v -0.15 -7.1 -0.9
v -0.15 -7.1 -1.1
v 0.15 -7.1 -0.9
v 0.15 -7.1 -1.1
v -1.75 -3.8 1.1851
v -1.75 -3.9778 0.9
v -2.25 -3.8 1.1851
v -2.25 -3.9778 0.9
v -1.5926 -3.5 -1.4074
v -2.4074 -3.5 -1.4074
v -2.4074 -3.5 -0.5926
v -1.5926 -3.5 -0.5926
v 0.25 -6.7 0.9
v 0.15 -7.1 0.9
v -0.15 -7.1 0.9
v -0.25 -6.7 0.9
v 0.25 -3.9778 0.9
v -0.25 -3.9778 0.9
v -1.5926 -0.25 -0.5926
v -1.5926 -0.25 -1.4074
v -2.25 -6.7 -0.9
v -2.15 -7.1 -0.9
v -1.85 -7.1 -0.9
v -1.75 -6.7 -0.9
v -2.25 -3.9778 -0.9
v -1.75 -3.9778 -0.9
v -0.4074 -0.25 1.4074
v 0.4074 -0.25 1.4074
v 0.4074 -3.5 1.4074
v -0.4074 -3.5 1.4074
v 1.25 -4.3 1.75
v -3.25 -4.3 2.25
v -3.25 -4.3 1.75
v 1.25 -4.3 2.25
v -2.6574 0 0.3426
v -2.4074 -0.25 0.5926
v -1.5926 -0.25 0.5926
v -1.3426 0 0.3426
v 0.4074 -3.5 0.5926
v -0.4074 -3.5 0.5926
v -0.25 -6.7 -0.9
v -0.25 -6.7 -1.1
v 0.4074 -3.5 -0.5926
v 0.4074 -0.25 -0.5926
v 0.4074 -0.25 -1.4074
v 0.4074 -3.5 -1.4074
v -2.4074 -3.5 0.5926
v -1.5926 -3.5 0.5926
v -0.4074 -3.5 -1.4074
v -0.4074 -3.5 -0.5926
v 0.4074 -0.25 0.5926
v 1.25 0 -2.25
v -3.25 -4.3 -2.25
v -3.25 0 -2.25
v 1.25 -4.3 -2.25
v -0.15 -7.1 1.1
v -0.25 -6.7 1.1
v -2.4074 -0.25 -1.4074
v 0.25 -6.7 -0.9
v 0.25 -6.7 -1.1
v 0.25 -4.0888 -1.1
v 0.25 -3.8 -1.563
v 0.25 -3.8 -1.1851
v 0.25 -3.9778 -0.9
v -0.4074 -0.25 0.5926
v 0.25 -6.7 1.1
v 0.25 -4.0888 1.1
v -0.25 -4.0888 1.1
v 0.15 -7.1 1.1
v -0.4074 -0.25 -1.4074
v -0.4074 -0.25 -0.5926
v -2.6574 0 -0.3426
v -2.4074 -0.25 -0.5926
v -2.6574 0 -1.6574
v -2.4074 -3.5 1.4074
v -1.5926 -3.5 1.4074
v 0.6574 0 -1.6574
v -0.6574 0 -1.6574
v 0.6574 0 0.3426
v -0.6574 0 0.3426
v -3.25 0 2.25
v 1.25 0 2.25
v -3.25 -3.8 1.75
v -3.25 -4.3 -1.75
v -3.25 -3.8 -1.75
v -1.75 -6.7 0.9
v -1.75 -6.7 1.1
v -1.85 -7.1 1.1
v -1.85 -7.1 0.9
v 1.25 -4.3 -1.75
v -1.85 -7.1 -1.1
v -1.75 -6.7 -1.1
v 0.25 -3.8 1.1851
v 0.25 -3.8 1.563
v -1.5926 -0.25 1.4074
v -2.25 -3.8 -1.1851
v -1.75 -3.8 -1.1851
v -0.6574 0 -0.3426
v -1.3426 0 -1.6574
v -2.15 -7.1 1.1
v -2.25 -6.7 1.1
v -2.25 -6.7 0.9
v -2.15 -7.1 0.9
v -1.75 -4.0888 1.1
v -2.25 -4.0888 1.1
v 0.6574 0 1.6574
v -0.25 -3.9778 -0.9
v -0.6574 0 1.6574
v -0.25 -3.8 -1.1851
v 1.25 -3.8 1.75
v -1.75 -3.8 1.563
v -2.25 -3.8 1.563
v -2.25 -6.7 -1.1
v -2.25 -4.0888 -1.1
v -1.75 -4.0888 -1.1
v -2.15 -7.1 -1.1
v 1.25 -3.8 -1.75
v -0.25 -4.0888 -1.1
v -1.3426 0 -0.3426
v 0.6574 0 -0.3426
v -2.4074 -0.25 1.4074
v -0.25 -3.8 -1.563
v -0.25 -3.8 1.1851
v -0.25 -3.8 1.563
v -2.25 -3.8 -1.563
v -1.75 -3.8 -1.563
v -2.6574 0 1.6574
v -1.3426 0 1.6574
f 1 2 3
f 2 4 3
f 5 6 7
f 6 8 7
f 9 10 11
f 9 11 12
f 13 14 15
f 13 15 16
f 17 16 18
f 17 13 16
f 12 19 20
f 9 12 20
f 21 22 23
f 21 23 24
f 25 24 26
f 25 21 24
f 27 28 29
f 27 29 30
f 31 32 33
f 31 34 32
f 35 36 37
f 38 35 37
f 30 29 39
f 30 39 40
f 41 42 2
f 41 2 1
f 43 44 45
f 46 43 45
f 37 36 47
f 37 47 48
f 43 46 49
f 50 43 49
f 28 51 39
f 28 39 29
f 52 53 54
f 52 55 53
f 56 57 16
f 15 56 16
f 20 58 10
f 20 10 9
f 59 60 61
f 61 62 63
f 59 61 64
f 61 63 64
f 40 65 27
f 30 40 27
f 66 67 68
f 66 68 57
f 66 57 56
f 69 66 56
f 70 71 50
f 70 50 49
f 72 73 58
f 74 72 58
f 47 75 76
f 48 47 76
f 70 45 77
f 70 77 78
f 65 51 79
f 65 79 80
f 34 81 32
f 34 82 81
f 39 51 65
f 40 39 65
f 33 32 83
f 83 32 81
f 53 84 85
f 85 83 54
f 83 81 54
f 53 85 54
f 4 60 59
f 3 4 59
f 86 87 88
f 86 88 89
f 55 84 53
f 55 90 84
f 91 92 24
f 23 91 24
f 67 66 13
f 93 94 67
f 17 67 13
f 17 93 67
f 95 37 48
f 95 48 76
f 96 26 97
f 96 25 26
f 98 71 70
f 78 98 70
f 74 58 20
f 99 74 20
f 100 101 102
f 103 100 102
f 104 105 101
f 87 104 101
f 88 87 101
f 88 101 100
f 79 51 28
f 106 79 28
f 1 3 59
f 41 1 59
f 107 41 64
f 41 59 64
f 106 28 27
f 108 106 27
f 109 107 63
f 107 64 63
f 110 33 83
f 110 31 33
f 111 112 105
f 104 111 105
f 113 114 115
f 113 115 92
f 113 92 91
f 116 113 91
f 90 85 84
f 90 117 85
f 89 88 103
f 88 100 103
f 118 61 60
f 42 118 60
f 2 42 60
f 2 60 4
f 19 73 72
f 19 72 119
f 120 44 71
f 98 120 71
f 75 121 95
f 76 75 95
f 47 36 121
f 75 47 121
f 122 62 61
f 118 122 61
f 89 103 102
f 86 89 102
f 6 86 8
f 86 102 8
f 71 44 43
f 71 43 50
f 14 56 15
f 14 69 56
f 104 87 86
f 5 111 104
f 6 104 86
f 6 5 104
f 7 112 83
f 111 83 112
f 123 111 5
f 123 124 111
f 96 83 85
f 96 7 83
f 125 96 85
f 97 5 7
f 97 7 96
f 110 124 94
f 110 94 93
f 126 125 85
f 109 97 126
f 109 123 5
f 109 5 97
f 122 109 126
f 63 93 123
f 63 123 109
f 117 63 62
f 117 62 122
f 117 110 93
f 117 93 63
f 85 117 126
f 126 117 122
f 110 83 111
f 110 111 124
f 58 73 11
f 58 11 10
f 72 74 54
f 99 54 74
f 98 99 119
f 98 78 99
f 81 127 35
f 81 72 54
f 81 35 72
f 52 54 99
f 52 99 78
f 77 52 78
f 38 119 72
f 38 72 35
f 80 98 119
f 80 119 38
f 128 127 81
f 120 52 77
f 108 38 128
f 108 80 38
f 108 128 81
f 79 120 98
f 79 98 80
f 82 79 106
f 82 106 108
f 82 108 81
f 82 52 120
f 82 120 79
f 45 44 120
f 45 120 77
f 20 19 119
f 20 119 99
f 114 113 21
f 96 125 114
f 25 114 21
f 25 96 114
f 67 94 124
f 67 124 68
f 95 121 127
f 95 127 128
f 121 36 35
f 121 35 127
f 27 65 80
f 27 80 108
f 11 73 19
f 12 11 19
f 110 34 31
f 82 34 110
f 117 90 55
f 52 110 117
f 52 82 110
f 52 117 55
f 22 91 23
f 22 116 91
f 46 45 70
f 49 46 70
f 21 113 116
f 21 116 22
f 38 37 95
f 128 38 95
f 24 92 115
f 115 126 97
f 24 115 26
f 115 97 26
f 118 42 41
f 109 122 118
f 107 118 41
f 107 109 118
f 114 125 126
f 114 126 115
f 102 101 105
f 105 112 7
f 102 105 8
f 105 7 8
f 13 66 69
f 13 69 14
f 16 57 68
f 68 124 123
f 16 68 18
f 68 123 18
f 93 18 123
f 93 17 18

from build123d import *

# Parameters (mm, degrees)
EXTRUDE_1_DEPTH            = 1
SKETCH_3_W                 = 0.814720046
SKETCH_3_H                 = 0.814720046
CUT_EXTRUDE_1_DEPTH        = 3.5
CHAMFER_1_SIZE             = 0.25
CHAMFER_1_OF_MIRROR_1_SIZE = 0.25
EXTRUDE_2_DEPTH            = 0.25
CHAMFER_2_SIZE             = 0.1
CHAMFER_2_SIZE2            = 0.4
CUT_EXTRUDE_2_DEPTH        = 8.514818694
EXTRUDE_4_DEPTH            = 0.25


with BuildPart() as part:
    # 草图1 → 凸台-拉伸1 (new, symmetric)
    with BuildSketch(Plane(origin=(0, 0, 0), x_dir=(0, 0, -1), z_dir=(1, 0, 0))):
        Polygon((-2.25, 0), (2.25, 0), (2.25, -4.3), (1.75, -4.3), (1.75, -3.8), (-1.75, -3.8), (-1.75, -4.3), (-2.25, -4.3), align=None)
    extrude(amount=EXTRUDE_1_DEPTH, both=True)

    # 草图3 → 切除-拉伸1 (cut)
    with BuildSketch(Plane(origin=(0, 0, 0), x_dir=(1, 0, 0), z_dir=(0, 1, 0))):
        with Locations((0, 1)):
            Rectangle(SKETCH_3_W, SKETCH_3_H)
    cut_extrude_1 = extrude(amount=-CUT_EXTRUDE_1_DEPTH, mode=Mode.SUBTRACT)

    # 倒角1
    chamfer_1_edges = [part.edges().sort_by_distance(p)[0] for p in [
        (-0.407360023, 0, -1),
        (0, 0, -0.592639977),
        (0.407360023, 0, -1),
        (0, 0, -1.407360023),
    ]]
    chamfer(chamfer_1_edges, length=CHAMFER_1_SIZE)

    # 镜向1: 切除-拉伸1 across plane
    add(cut_extrude_1.mirror(Plane.XY), mode=Mode.SUBTRACT)

    # 倒角1 of 镜向1
    chamfer_1_of_mirror_1_edges = [part.edges().sort_by_distance(p)[0] for p in [
        (-0.407360023, 0, 1),
        (0, 0, 0.592639977),
        (0.407360023, 0, 1),
        (0, 0, 1.407360023),
    ]]
    chamfer(chamfer_1_of_mirror_1_edges, length=CHAMFER_1_OF_MIRROR_1_SIZE)

    # 草图4 → 凸台-拉伸2 (add)
    with BuildSketch(Plane(origin=(0, 0, 0), x_dir=(0, 0, -1), z_dir=(1, 0, 0))):
        Polygon((1.562968954, -3.8), (1.1, -4.088782437), (1.1, -7.1), (0.9, -7.1), (0.9, -3.977816442), (1.18507098, -3.8), align=None)
    extrude(amount=EXTRUDE_2_DEPTH)

    # 倒角2
    chamfer_2_edges = [part.edges().sort_by_distance(p)[0] for p in [
        (0.25, -7.1, -1),
    ]]
    chamfer_2_side = [part.faces().sort_by_distance(p)[0] for p in [
        (0.125, -7.1, -1),
    ]]
    chamfer(chamfer_2_edges, length=CHAMFER_2_SIZE, length2=CHAMFER_2_SIZE2, reference=chamfer_2_side[0])

    # 草图5 → 切除-拉伸2 (cut, through all)
    with BuildSketch(Plane(origin=(0, 0, 0), x_dir=(1, 0, 0), z_dir=(0, 1, 0))):
        Polygon((0, 2.25), (-1, 2.25), (-1, -2.25), (1, -2.25), (1, 0), (0, 0), align=None)
    extrude(amount=-CUT_EXTRUDE_2_DEPTH, mode=Mode.SUBTRACT)

    # 镜向3: part across plane


with BuildPart() as part_1:
    add(part.part)
    add(part.part.mirror(Plane(origin=(0, 0, 0), x_dir=(0, 0, 1), z_dir=(1, 0, 0))))

    # 镜向4: part across plane


with BuildPart() as part_2:
    add(part_1.part)
    add(part_1.part.mirror(Plane(origin=(0, -7.1, 0), x_dir=(1, 0, 0), z_dir=(0, 0, -1))))

    # 草图6 → 凸台-拉伸4 (add)
    with BuildSketch(Plane(origin=(1, 0, 0), x_dir=(0, 0, -1), z_dir=(1, 0, 0))):
        Polygon((2.25, 0), (-2.25, 0), (-2.25, -4.3), (-1.75, -4.3), (-1.75, -3.8), (1.75, -3.8), (1.75, -4.3), (2.25, -4.3), align=None)
    extrude(amount=EXTRUDE_4_DEPTH)

    # 镜向5: part across face


with BuildPart() as part_3:
    add(part_2.part)
    add(part_2.part.mirror(Plane(origin=(-1, -1.961079545, 0), x_dir=(0, 0, 1), z_dir=(-1, 0, 0))))


solid = part_3.part
